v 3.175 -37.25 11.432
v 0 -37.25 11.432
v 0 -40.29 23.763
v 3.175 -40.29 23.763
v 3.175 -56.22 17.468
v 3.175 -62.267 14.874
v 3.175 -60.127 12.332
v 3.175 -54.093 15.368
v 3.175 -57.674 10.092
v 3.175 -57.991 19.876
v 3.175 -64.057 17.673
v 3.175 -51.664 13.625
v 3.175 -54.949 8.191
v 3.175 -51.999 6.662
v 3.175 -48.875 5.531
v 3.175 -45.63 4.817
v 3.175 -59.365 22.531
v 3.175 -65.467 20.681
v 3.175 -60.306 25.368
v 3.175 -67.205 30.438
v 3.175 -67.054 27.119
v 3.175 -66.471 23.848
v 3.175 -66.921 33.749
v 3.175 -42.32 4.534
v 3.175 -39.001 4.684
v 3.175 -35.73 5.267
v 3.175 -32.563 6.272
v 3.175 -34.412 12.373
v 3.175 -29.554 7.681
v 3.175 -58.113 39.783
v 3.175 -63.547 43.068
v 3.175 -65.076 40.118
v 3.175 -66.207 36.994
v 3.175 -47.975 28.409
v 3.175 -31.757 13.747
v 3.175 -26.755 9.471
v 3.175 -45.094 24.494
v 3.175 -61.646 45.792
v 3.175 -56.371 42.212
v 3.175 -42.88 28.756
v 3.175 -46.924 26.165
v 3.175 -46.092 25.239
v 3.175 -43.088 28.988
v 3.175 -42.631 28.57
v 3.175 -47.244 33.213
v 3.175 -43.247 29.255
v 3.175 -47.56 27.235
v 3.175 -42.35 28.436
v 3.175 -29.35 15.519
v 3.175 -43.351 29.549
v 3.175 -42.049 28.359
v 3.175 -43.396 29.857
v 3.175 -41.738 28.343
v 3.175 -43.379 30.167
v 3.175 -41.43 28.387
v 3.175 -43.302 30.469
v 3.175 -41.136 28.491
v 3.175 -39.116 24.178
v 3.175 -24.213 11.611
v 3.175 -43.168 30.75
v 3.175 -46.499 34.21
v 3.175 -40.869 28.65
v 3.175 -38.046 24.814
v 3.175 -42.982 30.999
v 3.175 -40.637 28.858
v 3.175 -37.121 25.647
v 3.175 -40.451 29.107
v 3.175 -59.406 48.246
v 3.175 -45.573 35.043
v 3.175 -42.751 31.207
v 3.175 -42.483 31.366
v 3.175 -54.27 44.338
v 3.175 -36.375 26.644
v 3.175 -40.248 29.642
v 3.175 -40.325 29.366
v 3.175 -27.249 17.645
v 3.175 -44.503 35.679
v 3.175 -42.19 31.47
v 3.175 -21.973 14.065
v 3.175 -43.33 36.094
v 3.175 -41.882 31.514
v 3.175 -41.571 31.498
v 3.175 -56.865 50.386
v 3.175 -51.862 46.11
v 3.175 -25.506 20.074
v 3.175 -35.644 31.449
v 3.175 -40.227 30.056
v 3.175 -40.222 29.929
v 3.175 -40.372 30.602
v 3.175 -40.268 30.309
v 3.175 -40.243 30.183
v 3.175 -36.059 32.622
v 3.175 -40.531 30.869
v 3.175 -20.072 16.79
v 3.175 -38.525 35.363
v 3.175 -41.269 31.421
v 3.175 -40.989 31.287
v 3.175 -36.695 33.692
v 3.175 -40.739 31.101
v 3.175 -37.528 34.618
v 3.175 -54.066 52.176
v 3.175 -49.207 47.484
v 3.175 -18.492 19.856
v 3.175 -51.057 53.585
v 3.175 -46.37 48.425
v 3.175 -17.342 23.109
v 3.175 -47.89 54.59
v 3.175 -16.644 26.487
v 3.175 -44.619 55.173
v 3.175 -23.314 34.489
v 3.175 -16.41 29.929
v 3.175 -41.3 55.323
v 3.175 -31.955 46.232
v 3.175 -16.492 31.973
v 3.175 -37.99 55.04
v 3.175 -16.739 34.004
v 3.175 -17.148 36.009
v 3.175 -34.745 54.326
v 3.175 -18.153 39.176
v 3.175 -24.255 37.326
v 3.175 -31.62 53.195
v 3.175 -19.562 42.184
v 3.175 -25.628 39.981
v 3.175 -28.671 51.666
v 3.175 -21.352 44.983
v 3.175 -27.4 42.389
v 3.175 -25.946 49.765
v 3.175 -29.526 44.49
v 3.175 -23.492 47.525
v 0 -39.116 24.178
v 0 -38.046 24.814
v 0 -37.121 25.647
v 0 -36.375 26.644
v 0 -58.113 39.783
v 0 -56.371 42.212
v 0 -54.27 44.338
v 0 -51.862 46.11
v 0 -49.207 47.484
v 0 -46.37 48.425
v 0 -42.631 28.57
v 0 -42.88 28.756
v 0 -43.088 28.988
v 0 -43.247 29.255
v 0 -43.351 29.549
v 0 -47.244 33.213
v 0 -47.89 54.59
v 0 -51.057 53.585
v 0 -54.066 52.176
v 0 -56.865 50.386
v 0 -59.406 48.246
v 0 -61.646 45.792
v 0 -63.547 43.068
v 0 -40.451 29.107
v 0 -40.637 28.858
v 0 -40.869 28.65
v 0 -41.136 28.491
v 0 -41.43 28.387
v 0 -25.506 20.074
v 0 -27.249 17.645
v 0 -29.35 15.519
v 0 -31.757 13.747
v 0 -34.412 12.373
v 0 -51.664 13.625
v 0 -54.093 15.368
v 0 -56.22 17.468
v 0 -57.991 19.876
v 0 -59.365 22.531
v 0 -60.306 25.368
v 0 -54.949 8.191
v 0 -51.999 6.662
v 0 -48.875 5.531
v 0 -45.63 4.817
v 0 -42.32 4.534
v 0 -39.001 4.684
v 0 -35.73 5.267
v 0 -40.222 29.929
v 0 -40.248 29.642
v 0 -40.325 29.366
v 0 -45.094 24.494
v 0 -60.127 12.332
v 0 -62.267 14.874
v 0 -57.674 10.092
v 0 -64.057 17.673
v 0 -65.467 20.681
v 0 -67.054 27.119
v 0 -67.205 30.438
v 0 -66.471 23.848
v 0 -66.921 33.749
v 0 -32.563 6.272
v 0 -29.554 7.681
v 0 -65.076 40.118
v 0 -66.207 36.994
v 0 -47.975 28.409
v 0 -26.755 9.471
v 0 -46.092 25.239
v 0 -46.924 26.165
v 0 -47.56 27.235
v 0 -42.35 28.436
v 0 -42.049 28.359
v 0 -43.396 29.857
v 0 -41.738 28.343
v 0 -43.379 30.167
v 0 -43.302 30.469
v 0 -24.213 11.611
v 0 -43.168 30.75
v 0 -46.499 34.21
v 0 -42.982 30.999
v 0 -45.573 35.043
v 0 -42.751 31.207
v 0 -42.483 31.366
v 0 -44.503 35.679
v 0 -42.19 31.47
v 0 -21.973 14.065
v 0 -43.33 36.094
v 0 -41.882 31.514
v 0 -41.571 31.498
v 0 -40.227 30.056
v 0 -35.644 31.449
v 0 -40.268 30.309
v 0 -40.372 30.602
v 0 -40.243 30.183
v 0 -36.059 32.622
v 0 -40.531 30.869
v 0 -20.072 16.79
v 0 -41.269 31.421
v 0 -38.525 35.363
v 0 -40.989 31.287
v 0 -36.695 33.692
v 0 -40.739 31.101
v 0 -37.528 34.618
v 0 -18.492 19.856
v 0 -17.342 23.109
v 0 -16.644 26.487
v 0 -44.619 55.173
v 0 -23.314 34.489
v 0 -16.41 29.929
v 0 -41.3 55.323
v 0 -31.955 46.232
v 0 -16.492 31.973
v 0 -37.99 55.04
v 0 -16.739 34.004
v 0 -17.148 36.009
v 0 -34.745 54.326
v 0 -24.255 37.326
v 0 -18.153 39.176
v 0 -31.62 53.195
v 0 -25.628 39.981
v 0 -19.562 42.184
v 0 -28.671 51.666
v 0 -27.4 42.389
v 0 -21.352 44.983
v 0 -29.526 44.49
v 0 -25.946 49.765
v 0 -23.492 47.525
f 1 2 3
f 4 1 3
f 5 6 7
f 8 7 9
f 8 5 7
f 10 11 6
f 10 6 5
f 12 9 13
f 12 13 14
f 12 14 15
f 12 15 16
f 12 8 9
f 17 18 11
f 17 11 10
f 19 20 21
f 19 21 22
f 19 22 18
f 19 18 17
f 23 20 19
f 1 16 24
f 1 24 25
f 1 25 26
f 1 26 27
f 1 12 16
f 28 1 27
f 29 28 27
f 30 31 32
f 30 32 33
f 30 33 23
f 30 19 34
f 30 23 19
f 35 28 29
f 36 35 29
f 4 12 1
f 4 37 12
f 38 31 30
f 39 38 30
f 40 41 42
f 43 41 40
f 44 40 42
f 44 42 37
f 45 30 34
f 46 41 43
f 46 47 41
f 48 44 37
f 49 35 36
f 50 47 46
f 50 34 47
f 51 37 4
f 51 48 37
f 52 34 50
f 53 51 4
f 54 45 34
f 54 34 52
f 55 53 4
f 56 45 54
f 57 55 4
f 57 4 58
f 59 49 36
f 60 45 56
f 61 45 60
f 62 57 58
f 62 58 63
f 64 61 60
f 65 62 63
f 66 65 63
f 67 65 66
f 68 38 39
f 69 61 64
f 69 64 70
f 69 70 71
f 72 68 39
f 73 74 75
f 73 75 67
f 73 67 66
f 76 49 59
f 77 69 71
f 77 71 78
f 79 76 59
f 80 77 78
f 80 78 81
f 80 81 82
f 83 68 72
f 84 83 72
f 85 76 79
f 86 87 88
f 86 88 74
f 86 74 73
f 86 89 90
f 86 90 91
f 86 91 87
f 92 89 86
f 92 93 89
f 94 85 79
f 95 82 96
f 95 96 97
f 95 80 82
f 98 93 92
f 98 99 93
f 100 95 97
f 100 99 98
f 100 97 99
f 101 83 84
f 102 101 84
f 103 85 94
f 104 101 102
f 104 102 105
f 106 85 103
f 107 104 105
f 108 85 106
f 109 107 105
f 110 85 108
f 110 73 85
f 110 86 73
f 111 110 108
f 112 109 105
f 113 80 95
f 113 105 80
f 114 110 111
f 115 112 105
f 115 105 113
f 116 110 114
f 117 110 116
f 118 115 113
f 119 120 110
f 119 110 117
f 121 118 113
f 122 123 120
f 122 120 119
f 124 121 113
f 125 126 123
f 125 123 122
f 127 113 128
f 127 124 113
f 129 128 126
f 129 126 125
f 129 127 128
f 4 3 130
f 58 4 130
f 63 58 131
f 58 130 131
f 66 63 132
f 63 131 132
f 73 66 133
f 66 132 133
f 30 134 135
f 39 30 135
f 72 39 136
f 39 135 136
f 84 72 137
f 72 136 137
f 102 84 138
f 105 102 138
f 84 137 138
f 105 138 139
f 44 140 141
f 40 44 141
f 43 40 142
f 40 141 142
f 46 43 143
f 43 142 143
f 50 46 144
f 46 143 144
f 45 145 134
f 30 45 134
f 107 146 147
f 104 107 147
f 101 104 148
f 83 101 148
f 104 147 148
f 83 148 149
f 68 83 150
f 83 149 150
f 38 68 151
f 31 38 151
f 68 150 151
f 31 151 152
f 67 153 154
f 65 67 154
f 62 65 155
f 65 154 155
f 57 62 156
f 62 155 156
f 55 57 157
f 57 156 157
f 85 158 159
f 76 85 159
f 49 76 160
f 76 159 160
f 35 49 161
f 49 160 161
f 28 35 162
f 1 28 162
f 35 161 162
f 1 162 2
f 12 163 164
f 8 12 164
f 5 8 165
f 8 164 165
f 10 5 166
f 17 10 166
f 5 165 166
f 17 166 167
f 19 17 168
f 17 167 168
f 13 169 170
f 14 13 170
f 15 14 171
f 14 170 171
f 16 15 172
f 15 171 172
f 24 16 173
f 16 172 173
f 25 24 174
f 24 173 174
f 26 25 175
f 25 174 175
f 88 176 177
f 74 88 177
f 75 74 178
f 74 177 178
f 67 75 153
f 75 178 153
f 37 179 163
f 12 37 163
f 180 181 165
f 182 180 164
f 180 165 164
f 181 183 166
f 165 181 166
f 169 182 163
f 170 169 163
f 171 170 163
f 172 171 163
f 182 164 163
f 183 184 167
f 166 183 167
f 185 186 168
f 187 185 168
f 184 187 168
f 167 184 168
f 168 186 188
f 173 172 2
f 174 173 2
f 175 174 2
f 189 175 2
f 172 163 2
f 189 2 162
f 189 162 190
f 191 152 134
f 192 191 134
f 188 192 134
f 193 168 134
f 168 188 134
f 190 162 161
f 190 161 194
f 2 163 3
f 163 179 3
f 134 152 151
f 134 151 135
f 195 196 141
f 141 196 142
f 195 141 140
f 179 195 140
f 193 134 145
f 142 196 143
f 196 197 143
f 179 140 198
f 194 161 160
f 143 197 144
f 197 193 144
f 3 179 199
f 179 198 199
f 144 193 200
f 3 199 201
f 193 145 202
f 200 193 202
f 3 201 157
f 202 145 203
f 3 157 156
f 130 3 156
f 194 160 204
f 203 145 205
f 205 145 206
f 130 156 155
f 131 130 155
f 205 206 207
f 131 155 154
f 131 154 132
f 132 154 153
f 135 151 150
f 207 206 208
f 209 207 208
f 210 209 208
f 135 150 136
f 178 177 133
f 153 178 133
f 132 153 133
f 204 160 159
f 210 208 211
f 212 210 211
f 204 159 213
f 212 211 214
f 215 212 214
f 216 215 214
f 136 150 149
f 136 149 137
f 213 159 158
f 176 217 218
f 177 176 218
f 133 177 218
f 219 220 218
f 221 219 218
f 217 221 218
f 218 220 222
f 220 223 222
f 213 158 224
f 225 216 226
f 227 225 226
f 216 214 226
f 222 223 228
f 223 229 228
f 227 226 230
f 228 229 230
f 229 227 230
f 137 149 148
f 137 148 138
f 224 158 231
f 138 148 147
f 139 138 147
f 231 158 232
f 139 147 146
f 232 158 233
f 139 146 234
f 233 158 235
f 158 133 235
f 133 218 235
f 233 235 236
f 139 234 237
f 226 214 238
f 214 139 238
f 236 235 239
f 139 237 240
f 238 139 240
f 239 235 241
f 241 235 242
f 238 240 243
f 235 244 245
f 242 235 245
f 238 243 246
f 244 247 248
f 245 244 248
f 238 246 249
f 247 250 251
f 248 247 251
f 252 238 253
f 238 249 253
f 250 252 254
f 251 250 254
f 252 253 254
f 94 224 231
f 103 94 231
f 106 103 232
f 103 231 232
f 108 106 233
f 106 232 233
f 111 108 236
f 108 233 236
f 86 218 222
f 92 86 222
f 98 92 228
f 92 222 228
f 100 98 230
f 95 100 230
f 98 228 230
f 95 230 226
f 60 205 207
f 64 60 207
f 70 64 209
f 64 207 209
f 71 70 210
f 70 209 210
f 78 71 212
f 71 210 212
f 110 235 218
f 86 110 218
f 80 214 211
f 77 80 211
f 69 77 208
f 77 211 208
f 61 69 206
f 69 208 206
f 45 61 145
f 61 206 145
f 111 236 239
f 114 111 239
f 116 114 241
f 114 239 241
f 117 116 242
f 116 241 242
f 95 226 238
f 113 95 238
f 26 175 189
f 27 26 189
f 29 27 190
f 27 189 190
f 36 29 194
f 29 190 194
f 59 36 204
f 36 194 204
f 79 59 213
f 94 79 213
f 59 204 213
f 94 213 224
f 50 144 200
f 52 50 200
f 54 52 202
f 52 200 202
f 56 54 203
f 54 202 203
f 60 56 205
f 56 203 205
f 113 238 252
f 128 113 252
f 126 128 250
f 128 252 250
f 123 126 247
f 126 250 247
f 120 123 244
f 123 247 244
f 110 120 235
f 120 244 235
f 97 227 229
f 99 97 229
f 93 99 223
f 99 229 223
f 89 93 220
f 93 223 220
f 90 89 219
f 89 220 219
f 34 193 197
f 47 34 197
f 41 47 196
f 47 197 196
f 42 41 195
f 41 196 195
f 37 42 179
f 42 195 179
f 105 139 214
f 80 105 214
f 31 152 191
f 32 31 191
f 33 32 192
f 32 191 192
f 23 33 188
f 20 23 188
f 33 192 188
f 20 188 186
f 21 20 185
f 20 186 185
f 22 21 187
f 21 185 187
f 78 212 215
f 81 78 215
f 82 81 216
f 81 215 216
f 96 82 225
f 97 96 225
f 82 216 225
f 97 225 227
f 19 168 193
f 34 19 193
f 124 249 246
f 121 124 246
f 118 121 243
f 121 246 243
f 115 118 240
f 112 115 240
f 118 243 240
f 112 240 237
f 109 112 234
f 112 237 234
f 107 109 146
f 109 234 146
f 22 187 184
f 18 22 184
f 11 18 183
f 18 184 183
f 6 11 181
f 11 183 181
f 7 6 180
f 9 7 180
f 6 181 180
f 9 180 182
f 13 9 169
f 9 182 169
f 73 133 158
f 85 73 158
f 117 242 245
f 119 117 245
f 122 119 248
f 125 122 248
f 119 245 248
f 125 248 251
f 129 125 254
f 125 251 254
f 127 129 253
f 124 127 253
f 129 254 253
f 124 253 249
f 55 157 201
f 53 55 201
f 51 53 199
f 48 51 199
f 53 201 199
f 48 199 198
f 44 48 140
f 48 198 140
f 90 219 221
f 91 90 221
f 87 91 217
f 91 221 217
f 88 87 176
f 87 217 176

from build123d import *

# Parameters (mm, degrees)
F1_DEPTH = 3.175


with BuildPart() as f1:
    # F0 (on Right) → F1 (new body)
    with BuildSketch(Plane.YZ):
        with BuildLine():
            Line((-40.4511333859, 29.1073653109), (-36.3753204967, 26.6437996954))
            ThreePointArc((-36.3753204967, 26.6437996954), (-35.6929146046, 28.2235683845), (-35.4597376823, 29.9285538495))
            ThreePointArc((-35.4597376823, 29.9285538495), (-35.506060347, 30.6941595257), (-35.6443525017, 31.4485951564))
            Line((-35.6443525017, 31.4485951564), (-40.2683913872, 30.3085641762))
            ThreePointArc((-40.2683913872, 30.3085641762), (-40.2338183485, 30.1199552685), (-40.2222376823, 29.9285538495))
            ThreePointArc((-40.2222376823, 29.9285538495), (-40.2805319129, 29.5023074832), (-40.4511333859, 29.1073653109))
        make_face()
        with BuildLine():
            ThreePointArc((-40.2896963754, 23.7631686688), (-38.0460118676, 24.8141752957), (-36.3753204967, 26.6437996954))
            Line((-36.3753204967, 26.6437996954), (-40.4511333859, 29.1073653109))
            ThreePointArc((-40.4511333859, 29.1073653109), (-40.8688062286, 28.649959211), (-41.4297273556, 28.3872075543))
            Line((-41.4297273556, 28.3872075543), (-40.2896963754, 23.7631686688))
        make_face()
        with BuildLine():
            ThreePointArc((-35.4597376823, 29.9285538495), (-35.6929146046, 28.2235683845), (-36.3753204967, 26.6437996954))
            Line((-36.3753204967, 26.6437996954), (-25.5064861254, 20.0742913873))
            ThreePointArc((-25.5064861254, 20.0742913873), (-23.4592684491, 24.8135974547), (-22.7597376823, 29.9285538495))
            ThreePointArc((-22.7597376823, 29.9285538495), (-22.8987056762, 32.2253708783), (-23.3135821405, 34.4886777702))
            Line((-23.3135821405, 34.4886777702), (-35.6443525017, 31.4485951564))
            ThreePointArc((-35.6443525017, 31.4485951564), (-35.506060347, 30.6941595257), (-35.4597376823, 29.9285538495))
        make_face()
        with BuildLine():
            Line((-37.2496137616, 11.4323983076), (-40.2896963754, 23.7631686688))
            ThreePointArc((-40.2896963754, 23.7631686688), (-42.7647933931, 23.6507860464), (-45.0944918364, 24.4941366638))
            Line((-45.0944918364, 24.4941366638), (-51.6640001445, 13.6253022926))
            ThreePointArc((-51.6640001445, 13.6253022926), (-44.6749048146, 11.0952504402), (-37.2496137616, 11.4323983076))
        make_face()
        with BuildLine():
            ThreePointArc((-45.0944918364, 24.4941366638), (-42.7647933931, 23.6507860464), (-40.2896963754, 23.7631686688))
            Line((-40.2896963754, 23.7631686688), (-41.4297273556, 28.3872075543))
            ThreePointArc((-41.4297273556, 28.3872075543), (-42.04850161, 28.3591118987), (-42.6309262209, 28.5699495531))
            Line((-42.6309262209, 28.5699495531), (-45.0944918364, 24.4941366638))
        make_face()
        with BuildLine():
            ThreePointArc((-22.7597376823, 29.9285538495), (-23.4592684491, 24.8135974547), (-25.5064861254, 20.0742913873))
            Line((-25.5064861254, 20.0742913873), (-20.0720689398, 16.7895372333))
            ThreePointArc((-20.0720689398, 16.7895372333), (-17.3424453714, 23.1086119897), (-16.4097376823, 29.9285538495))
            ThreePointArc((-16.4097376823, 29.9285538495), (-16.5950283409, 32.9909765546), (-17.1481969599, 36.0087190771))
            Line((-17.1481969599, 36.0087190771), (-23.3135821405, 34.4886777702))
            ThreePointArc((-23.3135821405, 34.4886777702), (-22.8987056762, 32.2253708783), (-22.7597376823, 29.9285538495))
        make_face()
        with BuildLine():
            Line((-20.0720689398, 16.7895372333), (-25.5064861254, 20.0742913873))
            ThreePointArc((-25.5064861254, 20.0742913873), (-30.518560238, 14.5854181882), (-37.2496137616, 11.4323983076))
            Line((-37.2496137616, 11.4323983076), (-35.7295724547, 5.267013127))
            ThreePointArc((-35.7295724547, 5.267013127), (-26.7548344232, 9.4710396345), (-20.0720689398, 16.7895372333))
        make_face()
        with BuildLine():
            Line((-40.2683913872, 30.3085641762), (-35.6443525017, 31.4485951564))
            ThreePointArc((-35.6443525017, 31.4485951564), (-36.6953591286, 33.6922796642), (-38.5249835283, 35.3629710351))
            Line((-38.5249835283, 35.3629710351), (-40.9885491438, 31.2871581459))
            ThreePointArc((-40.9885491438, 31.2871581459), (-40.5311430439, 30.8694853032), (-40.2683913872, 30.3085641762))
        make_face()
        with BuildLine():
            ThreePointArc((-47.975122863, 28.4085125426), (-46.9241162361, 26.1648280347), (-45.0944918364, 24.4941366638))
            Line((-45.0944918364, 24.4941366638), (-42.6309262209, 28.5699495531))
            ThreePointArc((-42.6309262209, 28.5699495531), (-43.0883323208, 28.9876223958), (-43.3510839775, 29.5485435227))
            Line((-43.3510839775, 29.5485435227), (-47.975122863, 28.4085125426))
        make_face()
        with BuildLine():
            Line((-35.7295724547, 5.267013127), (-37.2496137616, 11.4323983076))
            ThreePointArc((-37.2496137616, 11.4323983076), (-44.6749048146, 11.0952504402), (-51.6640001445, 13.6253022926))
            Line((-51.6640001445, 13.6253022926), (-54.9487542985, 8.1908851069))
            ThreePointArc((-54.9487542985, 8.1908851069), (-45.6299605253, 4.8174826371), (-35.7295724547, 5.267013127))
        make_face()
        with BuildLine():
            Line((-40.9885491438, 31.2871581459), (-38.5249835283, 35.3629710351))
            ThreePointArc((-38.5249835283, 35.3629710351), (-40.8546819716, 36.2063216525), (-43.3297789892, 36.0939390301))
            Line((-43.3297789892, 36.0939390301), (-42.1897480091, 31.4699001446))
            ThreePointArc((-42.1897480091, 31.4699001446), (-41.5709737547, 31.4979958002), (-40.9885491438, 31.2871581459))
        make_face()
        with BuildLine():
            ThreePointArc((-43.3297789892, 36.0939390301), (-40.8546819716, 36.2063216525), (-38.5249835283, 35.3629710351))
            Line((-38.5249835283, 35.3629710351), (-31.9554752202, 46.2318054064))
            ThreePointArc((-31.9554752202, 46.2318054064), (-38.9445705501, 48.7618572587), (-46.3698616031, 48.4247093913))
            Line((-46.3698616031, 48.4247093913), (-43.3297789892, 36.0939390301))
        make_face()
        with BuildLine():
            ThreePointArc((-31.9554752202, 46.2318054064), (-26.4666020211, 41.2197312938), (-23.3135821405, 34.4886777702))
            Line((-23.3135821405, 34.4886777702), (-17.1481969599, 36.0087190771))
            ThreePointArc((-17.1481969599, 36.0087190771), (-21.3522234673, 44.9834571086), (-28.6707210662, 51.666222592))
            Line((-28.6707210662, 51.666222592), (-31.9554752202, 46.2318054064))
        make_face()
        with BuildLine():
            Line((-60.3058932242, 25.3684299287), (-47.975122863, 28.4085125426))
            ThreePointArc((-47.975122863, 28.4085125426), (-48.0875054854, 30.8836095602), (-47.244154868, 33.2133080035))
            Line((-47.244154868, 33.2133080035), (-58.1129892392, 39.7828163116))
            ThreePointArc((-58.1129892392, 39.7828163116), (-60.6430410916, 32.7937209817), (-60.3058932242, 25.3684299287))
        make_face()
        with BuildLine():
            ThreePointArc((-47.244154868, 33.2133080035), (-48.0875054854, 30.8836095602), (-47.975122863, 28.4085125426))
            Line((-47.975122863, 28.4085125426), (-43.3510839775, 29.5485435227))
            ThreePointArc((-43.3510839775, 29.5485435227), (-43.3791796331, 30.1673177771), (-43.1683419788, 30.749742388))
            Line((-43.1683419788, 30.749742388), (-47.244154868, 33.2133080035))
        make_face()
        with BuildLine():
            Line((-54.9487542985, 8.1908851069), (-51.6640001445, 13.6253022926))
            ThreePointArc((-51.6640001445, 13.6253022926), (-57.1528733436, 18.6373764051), (-60.3058932242, 25.3684299287))
            Line((-60.3058932242, 25.3684299287), (-66.4712784048, 23.8483886218))
            ThreePointArc((-66.4712784048, 23.8483886218), (-62.2672518974, 14.8736505903), (-54.9487542985, 8.1908851069))
        make_face()
        with BuildLine():
            Line((-47.244154868, 33.2133080035), (-43.1683419788, 30.749742388))
            ThreePointArc((-43.1683419788, 30.749742388), (-42.750669136, 31.2071484879), (-42.1897480091, 31.4699001446))
            Line((-42.1897480091, 31.4699001446), (-43.3297789892, 36.0939390301))
            ThreePointArc((-43.3297789892, 36.0939390301), (-45.5734634971, 35.0429324032), (-47.244154868, 33.2133080035))
        make_face()
        with BuildLine():
            ThreePointArc((-46.3698616031, 48.4247093913), (-38.9445705501, 48.7618572587), (-31.9554752202, 46.2318054064))
            Line((-31.9554752202, 46.2318054064), (-28.6707210662, 51.666222592))
            ThreePointArc((-28.6707210662, 51.666222592), (-37.9895148394, 55.0396250618), (-47.88990291, 54.5900945719))
            Line((-47.88990291, 54.5900945719), (-46.3698616031, 48.4247093913))
        make_face()
        with BuildLine():
            Line((-66.4712784048, 23.8483886218), (-60.3058932242, 25.3684299287))
            ThreePointArc((-60.3058932242, 25.3684299287), (-60.6430410916, 32.7937209817), (-58.1129892392, 39.7828163116))
            Line((-58.1129892392, 39.7828163116), (-63.5474064249, 43.0675704656))
            ThreePointArc((-63.5474064249, 43.0675704656), (-66.9208088947, 33.7487766925), (-66.4712784048, 23.8483886218))
        make_face()
        with BuildLine():
            ThreePointArc((-58.1129892392, 39.7828163116), (-53.1009151267, 45.2716895107), (-46.3698616031, 48.4247093913))
            Line((-46.3698616031, 48.4247093913), (-47.88990291, 54.5900945719))
            ThreePointArc((-47.88990291, 54.5900945719), (-56.8646409415, 50.3860680645), (-63.5474064249, 43.0675704656))
            Line((-63.5474064249, 43.0675704656), (-58.1129892392, 39.7828163116))
        make_face()
    extrude(amount=F1_DEPTH)


solid = f1.part
